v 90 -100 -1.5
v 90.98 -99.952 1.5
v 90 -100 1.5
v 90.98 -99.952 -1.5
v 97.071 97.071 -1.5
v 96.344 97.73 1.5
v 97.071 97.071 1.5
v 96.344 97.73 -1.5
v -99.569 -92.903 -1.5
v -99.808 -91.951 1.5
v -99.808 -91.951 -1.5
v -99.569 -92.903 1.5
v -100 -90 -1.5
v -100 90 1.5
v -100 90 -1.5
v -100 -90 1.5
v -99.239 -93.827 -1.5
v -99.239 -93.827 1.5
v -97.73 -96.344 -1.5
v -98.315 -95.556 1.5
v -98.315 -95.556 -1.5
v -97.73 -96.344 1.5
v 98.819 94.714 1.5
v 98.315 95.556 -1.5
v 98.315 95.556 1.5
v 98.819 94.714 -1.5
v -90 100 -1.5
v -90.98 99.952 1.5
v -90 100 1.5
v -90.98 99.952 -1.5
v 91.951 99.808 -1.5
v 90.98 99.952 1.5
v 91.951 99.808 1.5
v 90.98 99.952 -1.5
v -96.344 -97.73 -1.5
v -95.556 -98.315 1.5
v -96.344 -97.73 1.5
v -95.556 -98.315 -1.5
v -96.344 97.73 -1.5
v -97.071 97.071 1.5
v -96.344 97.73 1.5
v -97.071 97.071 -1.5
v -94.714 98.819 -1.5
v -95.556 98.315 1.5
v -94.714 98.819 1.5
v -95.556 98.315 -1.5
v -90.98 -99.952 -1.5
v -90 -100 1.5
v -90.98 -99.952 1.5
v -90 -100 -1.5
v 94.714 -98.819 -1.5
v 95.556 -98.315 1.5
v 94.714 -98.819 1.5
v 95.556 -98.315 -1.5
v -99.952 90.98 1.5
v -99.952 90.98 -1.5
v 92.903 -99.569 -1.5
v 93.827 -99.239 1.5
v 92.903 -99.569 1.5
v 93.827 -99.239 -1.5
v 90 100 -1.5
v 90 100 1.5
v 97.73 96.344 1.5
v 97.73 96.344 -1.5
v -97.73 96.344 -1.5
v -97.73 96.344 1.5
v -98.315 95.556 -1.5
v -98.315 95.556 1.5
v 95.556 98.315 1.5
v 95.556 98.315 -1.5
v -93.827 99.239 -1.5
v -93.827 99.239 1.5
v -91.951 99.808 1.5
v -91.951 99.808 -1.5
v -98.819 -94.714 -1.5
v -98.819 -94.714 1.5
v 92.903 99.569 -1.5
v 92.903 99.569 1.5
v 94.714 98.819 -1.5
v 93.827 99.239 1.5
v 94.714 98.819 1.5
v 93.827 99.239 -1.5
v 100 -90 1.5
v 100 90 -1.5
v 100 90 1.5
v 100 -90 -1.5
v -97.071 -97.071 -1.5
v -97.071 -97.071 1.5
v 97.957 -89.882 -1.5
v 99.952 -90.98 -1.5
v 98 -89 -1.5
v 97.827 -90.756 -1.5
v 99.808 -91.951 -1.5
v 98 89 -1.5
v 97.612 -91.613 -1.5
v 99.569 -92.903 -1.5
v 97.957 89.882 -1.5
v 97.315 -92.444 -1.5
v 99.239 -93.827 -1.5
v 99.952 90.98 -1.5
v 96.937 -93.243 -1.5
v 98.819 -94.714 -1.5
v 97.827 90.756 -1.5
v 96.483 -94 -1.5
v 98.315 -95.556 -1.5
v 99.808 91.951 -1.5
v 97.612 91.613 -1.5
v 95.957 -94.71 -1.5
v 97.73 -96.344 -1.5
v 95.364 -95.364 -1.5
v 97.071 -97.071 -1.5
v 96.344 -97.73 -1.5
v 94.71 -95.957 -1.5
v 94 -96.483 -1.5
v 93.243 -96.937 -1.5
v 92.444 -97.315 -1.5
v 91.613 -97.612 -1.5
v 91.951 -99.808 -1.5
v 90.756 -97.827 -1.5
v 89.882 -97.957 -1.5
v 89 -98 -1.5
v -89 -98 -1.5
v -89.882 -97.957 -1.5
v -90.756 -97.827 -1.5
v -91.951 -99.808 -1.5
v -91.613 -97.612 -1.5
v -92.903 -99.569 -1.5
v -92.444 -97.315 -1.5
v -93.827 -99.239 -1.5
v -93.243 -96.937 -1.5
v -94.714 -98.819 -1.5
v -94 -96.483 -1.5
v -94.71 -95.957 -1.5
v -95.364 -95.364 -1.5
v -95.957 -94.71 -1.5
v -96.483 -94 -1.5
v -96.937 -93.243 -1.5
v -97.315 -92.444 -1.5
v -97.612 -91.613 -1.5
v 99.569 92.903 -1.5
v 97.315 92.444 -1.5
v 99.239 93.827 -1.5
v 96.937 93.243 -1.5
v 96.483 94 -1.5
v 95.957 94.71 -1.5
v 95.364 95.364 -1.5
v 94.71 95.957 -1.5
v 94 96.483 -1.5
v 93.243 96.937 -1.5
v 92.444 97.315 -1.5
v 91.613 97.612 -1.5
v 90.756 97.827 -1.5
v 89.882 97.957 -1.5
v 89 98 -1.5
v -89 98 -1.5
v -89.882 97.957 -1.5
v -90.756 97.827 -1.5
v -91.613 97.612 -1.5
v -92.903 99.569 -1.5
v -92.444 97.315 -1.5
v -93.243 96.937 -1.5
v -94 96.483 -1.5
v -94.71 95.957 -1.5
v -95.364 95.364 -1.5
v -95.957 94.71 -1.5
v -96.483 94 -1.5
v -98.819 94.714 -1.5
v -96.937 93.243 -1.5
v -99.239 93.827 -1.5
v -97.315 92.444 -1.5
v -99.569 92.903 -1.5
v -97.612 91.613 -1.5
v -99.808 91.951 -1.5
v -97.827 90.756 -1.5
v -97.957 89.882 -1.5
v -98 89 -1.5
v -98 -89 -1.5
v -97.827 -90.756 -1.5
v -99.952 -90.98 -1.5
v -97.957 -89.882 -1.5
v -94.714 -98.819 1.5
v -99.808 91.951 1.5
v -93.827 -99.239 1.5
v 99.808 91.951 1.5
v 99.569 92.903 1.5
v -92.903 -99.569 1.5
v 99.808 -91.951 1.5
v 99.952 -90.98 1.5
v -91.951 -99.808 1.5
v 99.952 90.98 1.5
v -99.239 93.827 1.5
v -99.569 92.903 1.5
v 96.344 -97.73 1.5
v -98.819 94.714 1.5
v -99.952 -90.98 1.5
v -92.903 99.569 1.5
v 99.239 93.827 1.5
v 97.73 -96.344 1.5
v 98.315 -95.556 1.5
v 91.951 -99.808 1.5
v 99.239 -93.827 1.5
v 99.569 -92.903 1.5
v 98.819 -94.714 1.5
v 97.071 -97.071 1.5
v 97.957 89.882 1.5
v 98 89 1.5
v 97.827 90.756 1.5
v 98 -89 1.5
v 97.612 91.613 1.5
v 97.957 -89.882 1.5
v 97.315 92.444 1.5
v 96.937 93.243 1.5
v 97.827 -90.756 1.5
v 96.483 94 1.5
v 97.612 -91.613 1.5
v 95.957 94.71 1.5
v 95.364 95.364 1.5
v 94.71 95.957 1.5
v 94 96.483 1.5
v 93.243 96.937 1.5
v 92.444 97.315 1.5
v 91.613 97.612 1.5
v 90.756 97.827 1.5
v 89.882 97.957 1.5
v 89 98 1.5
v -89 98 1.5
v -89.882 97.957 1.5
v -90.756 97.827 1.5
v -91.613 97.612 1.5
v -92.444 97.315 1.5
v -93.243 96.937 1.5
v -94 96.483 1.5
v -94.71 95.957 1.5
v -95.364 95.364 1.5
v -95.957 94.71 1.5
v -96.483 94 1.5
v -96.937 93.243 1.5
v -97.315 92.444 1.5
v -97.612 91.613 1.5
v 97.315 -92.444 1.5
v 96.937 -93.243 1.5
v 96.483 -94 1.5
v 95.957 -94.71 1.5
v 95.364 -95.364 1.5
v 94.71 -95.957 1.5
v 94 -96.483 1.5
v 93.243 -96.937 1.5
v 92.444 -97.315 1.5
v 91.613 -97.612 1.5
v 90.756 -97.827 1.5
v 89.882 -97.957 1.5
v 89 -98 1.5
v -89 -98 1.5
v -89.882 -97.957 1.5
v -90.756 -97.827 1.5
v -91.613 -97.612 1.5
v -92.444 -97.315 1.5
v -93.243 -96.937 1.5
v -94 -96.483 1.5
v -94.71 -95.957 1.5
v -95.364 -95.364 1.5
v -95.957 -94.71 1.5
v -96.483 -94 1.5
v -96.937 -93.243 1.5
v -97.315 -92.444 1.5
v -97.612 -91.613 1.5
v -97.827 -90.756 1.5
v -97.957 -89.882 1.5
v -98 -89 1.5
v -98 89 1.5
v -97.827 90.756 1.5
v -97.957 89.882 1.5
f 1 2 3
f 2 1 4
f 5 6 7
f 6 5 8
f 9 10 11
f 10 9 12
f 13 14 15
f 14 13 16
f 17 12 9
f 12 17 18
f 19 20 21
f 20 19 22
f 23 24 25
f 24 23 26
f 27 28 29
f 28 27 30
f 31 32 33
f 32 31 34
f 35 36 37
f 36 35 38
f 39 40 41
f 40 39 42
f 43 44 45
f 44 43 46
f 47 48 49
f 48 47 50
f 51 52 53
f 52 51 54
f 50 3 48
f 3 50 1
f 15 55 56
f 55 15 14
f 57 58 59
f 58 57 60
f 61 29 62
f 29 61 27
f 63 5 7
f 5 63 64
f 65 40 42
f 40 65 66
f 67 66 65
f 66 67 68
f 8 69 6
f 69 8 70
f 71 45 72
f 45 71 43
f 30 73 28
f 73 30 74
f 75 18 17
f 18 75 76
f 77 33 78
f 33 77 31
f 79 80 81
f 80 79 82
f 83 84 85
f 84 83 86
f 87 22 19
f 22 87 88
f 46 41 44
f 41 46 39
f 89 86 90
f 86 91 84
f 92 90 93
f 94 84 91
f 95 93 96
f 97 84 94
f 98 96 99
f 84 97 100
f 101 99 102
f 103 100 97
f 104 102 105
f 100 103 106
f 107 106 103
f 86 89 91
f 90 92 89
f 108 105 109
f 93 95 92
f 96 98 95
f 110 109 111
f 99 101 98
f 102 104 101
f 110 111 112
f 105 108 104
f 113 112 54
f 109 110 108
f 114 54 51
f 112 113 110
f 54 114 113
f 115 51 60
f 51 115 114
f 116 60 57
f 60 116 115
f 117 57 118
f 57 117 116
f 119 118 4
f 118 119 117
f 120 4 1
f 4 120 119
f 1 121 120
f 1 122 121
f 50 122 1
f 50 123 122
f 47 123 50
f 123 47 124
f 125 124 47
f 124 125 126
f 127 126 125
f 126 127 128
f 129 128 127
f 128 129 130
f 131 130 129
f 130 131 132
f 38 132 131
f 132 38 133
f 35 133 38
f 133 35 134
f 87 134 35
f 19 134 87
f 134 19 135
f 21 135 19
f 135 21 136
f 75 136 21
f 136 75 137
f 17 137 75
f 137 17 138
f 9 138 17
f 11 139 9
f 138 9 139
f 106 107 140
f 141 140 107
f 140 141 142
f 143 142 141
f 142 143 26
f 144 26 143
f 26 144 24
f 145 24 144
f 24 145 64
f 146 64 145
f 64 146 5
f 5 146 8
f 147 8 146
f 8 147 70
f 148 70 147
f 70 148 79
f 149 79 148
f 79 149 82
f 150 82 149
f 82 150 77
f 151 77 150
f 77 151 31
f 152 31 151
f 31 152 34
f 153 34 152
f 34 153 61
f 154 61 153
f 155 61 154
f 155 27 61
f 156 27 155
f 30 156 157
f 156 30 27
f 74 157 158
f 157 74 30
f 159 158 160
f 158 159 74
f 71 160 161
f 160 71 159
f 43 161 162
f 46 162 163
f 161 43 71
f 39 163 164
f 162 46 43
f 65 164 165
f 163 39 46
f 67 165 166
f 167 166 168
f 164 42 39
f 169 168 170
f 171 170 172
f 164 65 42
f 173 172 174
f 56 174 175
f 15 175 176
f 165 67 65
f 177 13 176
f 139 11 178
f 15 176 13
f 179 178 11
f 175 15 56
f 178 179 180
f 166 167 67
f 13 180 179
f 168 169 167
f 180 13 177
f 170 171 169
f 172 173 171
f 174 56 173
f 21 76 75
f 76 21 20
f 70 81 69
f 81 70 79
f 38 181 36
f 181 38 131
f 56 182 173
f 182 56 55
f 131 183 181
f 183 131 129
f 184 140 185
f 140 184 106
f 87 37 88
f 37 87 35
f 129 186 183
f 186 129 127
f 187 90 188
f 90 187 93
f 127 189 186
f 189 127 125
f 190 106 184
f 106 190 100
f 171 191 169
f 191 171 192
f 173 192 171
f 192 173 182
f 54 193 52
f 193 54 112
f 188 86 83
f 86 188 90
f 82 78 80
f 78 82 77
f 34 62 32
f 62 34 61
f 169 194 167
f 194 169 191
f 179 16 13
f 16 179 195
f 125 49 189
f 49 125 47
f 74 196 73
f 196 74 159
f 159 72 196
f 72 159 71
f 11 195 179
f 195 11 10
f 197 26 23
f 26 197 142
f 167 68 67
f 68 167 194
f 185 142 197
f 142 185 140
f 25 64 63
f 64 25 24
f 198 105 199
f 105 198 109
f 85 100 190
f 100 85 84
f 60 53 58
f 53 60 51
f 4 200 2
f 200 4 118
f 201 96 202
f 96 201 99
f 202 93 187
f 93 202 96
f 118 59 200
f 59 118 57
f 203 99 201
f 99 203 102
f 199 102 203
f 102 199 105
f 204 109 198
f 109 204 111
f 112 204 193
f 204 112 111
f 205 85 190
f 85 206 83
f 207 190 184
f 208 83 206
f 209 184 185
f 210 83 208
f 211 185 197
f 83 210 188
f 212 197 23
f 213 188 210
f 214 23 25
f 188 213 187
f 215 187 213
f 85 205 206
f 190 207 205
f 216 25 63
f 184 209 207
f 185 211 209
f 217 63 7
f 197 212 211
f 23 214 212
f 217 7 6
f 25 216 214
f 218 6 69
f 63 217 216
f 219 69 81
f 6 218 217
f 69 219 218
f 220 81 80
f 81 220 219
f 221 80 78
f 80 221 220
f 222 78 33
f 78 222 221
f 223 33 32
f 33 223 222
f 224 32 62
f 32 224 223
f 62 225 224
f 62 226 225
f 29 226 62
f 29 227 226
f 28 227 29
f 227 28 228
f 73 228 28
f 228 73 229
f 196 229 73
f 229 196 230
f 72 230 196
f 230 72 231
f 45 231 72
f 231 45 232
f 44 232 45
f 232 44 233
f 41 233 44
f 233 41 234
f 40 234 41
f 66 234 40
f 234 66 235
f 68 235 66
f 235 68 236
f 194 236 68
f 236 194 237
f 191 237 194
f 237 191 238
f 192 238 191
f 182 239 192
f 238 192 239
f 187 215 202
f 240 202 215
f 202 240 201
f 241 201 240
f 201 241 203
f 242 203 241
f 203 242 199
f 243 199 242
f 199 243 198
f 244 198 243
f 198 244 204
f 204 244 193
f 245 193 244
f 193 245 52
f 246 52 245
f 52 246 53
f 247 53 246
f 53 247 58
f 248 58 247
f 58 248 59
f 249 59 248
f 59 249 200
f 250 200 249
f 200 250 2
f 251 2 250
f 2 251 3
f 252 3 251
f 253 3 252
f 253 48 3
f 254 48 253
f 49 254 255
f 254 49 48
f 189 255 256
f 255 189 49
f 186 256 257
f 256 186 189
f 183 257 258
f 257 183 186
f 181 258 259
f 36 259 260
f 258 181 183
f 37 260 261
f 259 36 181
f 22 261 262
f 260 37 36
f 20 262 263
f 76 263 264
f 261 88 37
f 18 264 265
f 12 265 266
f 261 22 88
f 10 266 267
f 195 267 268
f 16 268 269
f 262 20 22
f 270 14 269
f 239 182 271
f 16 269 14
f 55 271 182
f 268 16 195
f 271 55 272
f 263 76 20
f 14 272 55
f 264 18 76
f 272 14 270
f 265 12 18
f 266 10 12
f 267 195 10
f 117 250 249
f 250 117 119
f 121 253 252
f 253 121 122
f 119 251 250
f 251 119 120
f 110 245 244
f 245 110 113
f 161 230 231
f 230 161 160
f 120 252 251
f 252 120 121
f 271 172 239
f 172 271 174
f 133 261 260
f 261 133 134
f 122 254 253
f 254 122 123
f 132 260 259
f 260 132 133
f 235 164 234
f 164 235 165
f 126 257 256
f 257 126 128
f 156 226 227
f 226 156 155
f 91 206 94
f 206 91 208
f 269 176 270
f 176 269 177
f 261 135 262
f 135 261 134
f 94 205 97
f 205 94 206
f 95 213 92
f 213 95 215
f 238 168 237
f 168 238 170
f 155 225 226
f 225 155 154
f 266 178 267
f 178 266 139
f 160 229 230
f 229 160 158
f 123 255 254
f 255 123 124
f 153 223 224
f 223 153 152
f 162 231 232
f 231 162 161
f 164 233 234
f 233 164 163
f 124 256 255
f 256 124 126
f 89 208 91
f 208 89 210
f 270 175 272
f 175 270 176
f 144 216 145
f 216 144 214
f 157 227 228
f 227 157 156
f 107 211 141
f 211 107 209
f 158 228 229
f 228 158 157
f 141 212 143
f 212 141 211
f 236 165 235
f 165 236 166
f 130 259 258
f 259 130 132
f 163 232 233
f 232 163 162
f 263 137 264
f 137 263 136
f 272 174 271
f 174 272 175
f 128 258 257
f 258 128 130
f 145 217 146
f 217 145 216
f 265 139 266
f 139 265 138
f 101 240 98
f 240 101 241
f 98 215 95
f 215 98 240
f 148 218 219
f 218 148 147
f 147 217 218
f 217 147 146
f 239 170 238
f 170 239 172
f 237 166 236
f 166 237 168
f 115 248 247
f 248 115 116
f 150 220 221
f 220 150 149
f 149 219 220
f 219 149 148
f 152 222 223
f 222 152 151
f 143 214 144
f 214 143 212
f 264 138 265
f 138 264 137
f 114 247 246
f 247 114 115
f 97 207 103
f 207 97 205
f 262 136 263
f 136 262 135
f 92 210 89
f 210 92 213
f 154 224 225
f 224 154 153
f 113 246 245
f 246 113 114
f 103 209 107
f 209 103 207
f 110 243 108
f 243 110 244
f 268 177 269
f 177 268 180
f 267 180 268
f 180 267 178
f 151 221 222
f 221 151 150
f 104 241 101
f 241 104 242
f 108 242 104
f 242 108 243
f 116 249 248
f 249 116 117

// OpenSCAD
// Parameters
sheet_length = 200; //[100:400:1]
sheet_width = 200;  //[100:400:1]
sheet_thickness = 3; //[1.5:6:0.5]
corner_radius = 10; //[5:20:1]
hole_diameter = 6;  //[3:12:0.5]
hole_edge_offset = 20; //[10:40:1]
chamfer_size = 1;   //[0.5:3:0.25]
overlap = 1;        //[0.5:2:0.5]

$fn = 64;

// Helpers
function clamp(v, lo, hi) = v < lo ? lo : (v > hi ? hi : v);

// Keep parameters valid
corner_r = clamp(corner_radius, 0, min(sheet_length, sheet_width)/2);
hole_off = clamp(hole_edge_offset, hole_diameter/2 + 0.1, min(sheet_length, sheet_width)/2 - corner_r - 0.1);
chamfer = clamp(chamfer_size, 0, min(sheet_length, sheet_width, sheet_thickness)/2 - 0.01);

// Rounded rectangle sheet (single connected solid)
module rounded_sheet(L, W, T, R) {
    linear_extrude(height=T, center=true, convexity=10)
        offset(r=R)
            square([L - 2*R, W - 2*R], center=true);
}

module holes(L, W, T, off, d) {
    for (sx = [-1, 1], sy = [-1, 1])
        translate([sx*(L/2 - off), sy*(W/2 - off), 0])
            cylinder(h=T + 2*overlap, r=d/2, center=true);
}

// Simple edge chamfer by subtracting a slightly smaller rounded sheet
module chamfer_cut(L, W, T, R, c) {
    if (c > 0)
        translate([0, 0, c/2])
            linear_extrude(height=T + 2*overlap, center=true, convexity=10)
                offset(r=max(R - c, 0))
                    square([L - 2*R - 2*c, W - 2*R - 2*c], center=true);
}

// Final model
difference() {
    rounded_sheet(sheet_length, sheet_width, sheet_thickness, corner_r);
    holes(sheet_length, sheet_width, sheet_thickness, hole_off, hole_diameter);
    chamfer_cut(sheet_length, sheet_width, sheet_thickness, corner_r, chamfer);
}
